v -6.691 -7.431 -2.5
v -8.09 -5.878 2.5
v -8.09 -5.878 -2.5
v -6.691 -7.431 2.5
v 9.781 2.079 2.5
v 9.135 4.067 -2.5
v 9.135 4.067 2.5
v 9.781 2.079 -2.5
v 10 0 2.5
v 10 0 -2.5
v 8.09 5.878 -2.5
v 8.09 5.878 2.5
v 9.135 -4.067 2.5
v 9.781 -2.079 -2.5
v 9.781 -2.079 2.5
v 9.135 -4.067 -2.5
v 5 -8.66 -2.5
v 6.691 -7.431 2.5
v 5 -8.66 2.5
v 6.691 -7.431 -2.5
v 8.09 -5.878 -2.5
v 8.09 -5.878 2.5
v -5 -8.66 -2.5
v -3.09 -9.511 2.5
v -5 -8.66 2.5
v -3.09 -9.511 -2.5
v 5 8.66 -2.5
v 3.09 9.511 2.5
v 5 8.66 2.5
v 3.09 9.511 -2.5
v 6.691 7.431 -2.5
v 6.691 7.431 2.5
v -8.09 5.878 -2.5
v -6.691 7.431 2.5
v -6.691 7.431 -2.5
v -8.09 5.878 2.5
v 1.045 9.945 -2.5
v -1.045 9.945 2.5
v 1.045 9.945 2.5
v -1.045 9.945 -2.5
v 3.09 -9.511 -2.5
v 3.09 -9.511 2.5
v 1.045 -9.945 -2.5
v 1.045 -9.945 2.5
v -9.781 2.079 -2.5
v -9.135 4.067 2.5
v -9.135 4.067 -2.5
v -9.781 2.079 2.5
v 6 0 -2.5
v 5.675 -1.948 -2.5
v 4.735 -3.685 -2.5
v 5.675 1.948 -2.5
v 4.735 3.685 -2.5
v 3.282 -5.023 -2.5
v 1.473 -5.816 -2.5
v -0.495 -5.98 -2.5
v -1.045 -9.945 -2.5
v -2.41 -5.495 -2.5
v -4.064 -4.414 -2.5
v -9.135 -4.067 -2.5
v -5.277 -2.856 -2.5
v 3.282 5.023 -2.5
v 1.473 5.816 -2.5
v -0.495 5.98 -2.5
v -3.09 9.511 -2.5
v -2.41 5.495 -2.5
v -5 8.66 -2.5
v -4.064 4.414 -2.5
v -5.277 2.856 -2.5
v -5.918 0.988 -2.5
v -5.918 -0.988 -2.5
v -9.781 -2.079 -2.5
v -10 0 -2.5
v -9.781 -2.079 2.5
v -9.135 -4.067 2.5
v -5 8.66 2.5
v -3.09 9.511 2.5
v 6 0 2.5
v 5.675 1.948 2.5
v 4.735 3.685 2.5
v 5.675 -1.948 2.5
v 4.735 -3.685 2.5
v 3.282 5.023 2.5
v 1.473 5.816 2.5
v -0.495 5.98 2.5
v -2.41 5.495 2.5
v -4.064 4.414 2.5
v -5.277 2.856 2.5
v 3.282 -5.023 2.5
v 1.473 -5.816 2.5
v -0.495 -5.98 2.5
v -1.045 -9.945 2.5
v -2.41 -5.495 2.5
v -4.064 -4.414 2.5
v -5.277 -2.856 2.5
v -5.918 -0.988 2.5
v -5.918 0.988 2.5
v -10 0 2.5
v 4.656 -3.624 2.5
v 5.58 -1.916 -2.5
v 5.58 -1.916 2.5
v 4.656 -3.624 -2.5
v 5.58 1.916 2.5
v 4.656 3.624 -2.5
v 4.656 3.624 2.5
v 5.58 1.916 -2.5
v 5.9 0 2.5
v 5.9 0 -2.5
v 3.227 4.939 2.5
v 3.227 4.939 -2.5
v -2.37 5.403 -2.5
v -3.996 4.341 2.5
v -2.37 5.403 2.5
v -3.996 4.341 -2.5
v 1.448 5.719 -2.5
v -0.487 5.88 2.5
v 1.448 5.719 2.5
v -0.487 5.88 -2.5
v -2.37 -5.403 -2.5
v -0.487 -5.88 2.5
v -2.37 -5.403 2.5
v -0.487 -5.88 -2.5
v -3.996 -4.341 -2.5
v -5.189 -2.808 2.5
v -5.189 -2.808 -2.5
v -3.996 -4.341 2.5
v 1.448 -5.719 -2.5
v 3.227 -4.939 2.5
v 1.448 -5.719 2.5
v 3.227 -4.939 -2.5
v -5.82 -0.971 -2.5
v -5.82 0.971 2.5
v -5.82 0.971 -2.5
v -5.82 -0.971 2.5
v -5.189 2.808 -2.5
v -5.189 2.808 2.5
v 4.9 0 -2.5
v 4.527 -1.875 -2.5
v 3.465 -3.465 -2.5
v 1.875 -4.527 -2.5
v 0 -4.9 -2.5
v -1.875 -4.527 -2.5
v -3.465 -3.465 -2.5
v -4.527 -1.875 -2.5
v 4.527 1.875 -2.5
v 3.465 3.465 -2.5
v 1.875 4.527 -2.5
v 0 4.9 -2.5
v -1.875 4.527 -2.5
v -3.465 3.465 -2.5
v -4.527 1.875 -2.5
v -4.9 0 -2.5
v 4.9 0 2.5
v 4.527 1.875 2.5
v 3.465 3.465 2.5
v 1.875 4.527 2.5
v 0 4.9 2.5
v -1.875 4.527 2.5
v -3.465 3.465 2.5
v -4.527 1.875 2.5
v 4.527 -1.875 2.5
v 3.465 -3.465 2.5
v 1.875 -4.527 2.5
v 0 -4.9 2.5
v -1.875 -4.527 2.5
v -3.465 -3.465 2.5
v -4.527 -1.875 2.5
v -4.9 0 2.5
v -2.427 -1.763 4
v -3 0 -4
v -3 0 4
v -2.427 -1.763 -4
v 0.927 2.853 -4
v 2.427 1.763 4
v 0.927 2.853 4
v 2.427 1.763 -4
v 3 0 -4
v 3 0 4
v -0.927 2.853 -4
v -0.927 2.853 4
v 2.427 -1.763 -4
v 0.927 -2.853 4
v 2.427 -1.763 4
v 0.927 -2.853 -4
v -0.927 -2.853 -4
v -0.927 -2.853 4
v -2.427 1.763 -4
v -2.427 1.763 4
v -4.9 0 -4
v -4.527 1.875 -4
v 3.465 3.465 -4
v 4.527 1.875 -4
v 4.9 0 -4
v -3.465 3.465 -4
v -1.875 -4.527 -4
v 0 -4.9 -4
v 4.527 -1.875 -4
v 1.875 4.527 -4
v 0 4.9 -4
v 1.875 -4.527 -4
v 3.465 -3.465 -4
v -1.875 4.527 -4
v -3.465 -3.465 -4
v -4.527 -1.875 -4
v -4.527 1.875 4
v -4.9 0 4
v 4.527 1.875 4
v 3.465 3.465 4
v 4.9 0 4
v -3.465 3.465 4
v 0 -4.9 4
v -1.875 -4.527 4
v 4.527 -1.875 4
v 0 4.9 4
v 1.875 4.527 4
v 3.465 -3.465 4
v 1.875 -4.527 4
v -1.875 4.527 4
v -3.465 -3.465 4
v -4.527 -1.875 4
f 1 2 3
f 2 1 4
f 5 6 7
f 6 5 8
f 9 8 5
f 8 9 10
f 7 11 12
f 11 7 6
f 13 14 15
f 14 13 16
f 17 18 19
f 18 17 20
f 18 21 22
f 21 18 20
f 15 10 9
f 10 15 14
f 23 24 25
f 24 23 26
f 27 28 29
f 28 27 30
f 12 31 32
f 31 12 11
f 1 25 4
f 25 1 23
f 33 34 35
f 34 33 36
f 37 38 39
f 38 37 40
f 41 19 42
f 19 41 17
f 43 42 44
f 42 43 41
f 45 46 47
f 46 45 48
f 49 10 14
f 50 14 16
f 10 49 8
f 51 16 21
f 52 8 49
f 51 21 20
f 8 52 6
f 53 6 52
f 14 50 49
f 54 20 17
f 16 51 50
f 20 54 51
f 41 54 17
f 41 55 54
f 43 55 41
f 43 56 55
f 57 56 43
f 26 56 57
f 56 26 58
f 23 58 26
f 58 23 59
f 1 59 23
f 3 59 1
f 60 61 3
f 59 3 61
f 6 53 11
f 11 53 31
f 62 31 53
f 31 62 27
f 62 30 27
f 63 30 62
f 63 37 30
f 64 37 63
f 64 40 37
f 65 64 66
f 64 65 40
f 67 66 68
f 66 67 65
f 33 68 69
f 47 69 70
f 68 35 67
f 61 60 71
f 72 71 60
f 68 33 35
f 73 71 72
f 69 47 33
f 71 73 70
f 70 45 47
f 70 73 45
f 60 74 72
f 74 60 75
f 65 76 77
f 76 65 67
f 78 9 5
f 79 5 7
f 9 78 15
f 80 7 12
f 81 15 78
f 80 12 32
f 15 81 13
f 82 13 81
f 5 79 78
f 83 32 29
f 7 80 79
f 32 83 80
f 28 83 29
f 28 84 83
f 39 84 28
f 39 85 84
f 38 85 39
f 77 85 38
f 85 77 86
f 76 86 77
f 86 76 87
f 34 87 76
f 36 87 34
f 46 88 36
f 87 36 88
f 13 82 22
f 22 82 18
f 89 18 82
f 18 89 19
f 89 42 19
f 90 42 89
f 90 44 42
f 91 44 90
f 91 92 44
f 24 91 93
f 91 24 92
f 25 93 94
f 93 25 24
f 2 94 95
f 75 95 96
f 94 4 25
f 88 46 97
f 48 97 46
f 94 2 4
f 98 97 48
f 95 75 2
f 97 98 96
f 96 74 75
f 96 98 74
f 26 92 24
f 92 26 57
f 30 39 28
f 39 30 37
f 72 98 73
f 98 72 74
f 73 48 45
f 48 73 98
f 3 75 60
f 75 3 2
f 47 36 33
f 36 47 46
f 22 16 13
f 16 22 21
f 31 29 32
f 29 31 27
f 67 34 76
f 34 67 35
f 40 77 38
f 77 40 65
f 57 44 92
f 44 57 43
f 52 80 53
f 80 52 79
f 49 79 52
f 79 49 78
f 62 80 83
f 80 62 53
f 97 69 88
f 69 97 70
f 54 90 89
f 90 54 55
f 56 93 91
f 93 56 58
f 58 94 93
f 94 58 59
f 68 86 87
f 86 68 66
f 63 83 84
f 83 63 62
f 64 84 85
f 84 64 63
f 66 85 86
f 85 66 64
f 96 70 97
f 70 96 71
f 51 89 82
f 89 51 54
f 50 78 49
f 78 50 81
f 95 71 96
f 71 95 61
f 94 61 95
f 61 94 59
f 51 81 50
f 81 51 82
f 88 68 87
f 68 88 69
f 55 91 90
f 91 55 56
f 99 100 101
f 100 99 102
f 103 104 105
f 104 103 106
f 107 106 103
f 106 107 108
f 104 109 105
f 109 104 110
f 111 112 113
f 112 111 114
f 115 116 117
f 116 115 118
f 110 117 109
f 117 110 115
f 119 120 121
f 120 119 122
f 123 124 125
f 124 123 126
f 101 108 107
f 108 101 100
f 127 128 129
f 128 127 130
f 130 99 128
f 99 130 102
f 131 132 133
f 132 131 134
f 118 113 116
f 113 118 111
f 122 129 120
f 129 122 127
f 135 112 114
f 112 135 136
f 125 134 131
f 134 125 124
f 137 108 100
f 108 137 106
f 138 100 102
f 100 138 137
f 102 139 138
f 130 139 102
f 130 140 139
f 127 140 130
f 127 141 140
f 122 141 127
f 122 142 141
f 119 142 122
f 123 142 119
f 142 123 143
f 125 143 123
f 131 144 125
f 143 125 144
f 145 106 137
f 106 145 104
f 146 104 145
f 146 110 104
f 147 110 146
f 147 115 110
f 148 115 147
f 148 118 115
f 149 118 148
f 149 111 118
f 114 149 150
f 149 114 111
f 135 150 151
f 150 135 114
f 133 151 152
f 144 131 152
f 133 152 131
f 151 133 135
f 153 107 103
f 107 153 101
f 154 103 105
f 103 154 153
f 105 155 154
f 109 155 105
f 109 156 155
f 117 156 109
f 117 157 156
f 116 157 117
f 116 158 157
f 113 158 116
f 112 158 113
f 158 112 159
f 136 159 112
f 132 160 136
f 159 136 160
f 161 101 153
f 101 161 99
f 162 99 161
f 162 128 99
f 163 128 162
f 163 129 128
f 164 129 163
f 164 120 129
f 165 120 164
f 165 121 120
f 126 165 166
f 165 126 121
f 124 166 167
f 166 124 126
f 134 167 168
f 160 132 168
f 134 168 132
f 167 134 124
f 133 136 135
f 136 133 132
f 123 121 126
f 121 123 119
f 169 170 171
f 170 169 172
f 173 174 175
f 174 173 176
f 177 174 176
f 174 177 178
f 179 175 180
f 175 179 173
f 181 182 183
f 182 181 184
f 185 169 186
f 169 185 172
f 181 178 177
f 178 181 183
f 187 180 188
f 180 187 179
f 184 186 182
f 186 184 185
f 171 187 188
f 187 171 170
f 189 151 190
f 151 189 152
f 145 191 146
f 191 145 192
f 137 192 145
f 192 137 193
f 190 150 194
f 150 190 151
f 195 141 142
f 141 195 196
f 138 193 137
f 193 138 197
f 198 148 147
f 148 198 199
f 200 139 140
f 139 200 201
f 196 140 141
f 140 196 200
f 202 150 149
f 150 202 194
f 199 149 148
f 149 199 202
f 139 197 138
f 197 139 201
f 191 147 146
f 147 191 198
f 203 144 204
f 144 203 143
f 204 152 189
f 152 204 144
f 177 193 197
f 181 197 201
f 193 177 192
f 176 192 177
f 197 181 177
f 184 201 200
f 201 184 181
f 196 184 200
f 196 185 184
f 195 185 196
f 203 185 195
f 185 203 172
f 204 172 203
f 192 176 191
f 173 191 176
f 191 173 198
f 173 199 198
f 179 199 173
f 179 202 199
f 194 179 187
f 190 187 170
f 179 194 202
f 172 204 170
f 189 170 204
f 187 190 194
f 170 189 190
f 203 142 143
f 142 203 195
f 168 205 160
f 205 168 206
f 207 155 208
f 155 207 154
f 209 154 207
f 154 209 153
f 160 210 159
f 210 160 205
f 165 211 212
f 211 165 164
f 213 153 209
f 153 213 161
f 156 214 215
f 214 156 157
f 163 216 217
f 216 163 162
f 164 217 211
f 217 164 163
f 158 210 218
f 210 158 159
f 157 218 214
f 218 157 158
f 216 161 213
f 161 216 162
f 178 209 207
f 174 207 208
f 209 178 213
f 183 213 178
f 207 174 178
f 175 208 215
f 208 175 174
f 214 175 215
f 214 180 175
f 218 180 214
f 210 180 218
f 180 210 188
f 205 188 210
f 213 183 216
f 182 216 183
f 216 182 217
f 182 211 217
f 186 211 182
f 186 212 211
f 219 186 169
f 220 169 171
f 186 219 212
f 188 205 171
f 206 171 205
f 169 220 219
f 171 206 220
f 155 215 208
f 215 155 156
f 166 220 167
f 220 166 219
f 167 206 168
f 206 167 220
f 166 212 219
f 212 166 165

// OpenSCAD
// file: 00_config.scad
// 00str00der v2 by Free Beachler
// Apache 2 License

/////// Global Settings ////////
o = 0.001;

filament_dia = 3;
filament_dia_tolerance = 0.1;	// +/- tolerance
filament_slot = 1;

belt_len = 90 * 2;  // for gt2 pulleys #of teeth x 2mm pitch

bowden = 0;	// 0 for bowden, 1 for direct drive
base_width = 30;
base_thickness = 4;
tower_height = 52;
pushfit_dia = 0.375*25.4;	// for bowden
pushfit_h = 0.25*25.4;		// for bowden
hob_pulley_offset = 3;	// move hob pulley up/down w/respect to drive pulley z-axis plane

knurled_bolt_dia = 6;
knurled_bolt_len = 65 + 5;	// + 5 for head
knurled_bolt_thread_len = 24;
knurled_bolt_knurl_pos = knurled_bolt_len - 24 - 10;	// pos from head
knurled_bolt_hob_width = 10;

bearing_sleeve = 1;		// 1 for sleeve bearings, 0 for roller bearings
bearing_id = 6.02 + 0.05;
bearing_od = 12.7 + 0.07;
bearing_height = 9.6;
bearing_flange_dia = 14.2;

idler_width = 30;
idler_leadout = 30;
idler_height = 13;
idler_roller_z_offset = 2.1;
idler_roller_leadout_offset = 0;

idler_bolt_dia = 6;
idler_bolt_len = 45;
idler_roller_dia = 20;	// diameter of idler roller
idler_roller_thickness = 5;
idler_bearing_od = 12;
idler_washer_dia = idler_bearing_od - 2;
idler_washer_thickness = 3;

/*
bearing_sleeve = 0;		// 1 for sleeve bearings, 0 for roller bearings
bearing_id = 8;
bearing_od = 22;
bearing_height = 16;
bearing_flange_dia = 13.5;
*/

/// gt2 pulley dias indexed by tooth size
gt2_pulley_dias = [ -1,
	-1, -1, -1, -1, -1, -1, -1, -1, -1, -1,
	-1, -1, -1, -1, -1, 10.19, 10.82, -1, -1, -1,
	-1, -1, -1, -1, -1, -1, -1, -1, -1, -1,
	-1, -1, -1, -1, -1, 22.92, -1, -1, -1, -1,
	-1, -1, -1, -1, -1, -1, -1, -1, -1, -1,
	-1, -1, -1, -1, -1, -1, -1, -1, -1, 38.2,
	-1, 39.47, -1, -1, 41.38, -1, -1, -1, -1, -1];
// file: 00_functions.scad
// 00str00der v2 by Free Beachler
// Apache 2 License

use <MCAD/motors.scad>
use <MCAD/nuts_and_bolts.scad>

// Calculate parameters for pulley separation
function aVal(belt_len, hobP, driveP) = (belt_len / 2) - 0.7855 * (hobP + driveP);
function bVal(a, hobP, driveP) = hobP > driveP ? a / (hobP - driveP) : a / (hobP + driveP);
function cVal(a, corr) = a / corr;

///// Calculate the correction factor
///// fit from tabulated data @ http://www.york-ind.com/print_cat/engineering.pdf
function corr(b) = 0.001937038323*pow(b,10) - 0.05808154202*pow(b,9) + 0.761293059*pow(b,8) - 5.736122913*pow(b,7) + 27.47727309*pow(b,6) - 87.33413058*pow(b,5) + 186.371874*pow(b,4) - 263.6175218*pow(b,3) + 236.7515116*pow(b,2) - 122.301777*pow(b,1) + 28.86267614;

module fillet(rad,height) {
	translate([-rad,-rad,0])
		difference() {
			translate([0,0,-height/2]) cube([rad-0.05,rad-0.05,height]);
cylinder(h=height+1,r=rad,center=true);
		}
}

module nutSlot(slot, tolerance, size = 4) {
	union() {
		for (i=[0:0.5:slot]) {
			translate([i,0,0]) nutHole(size,tolerance=tolerance);
		}
	}
}

module slot(radius, length, depth) {
	translate([0, -length / 2, 0]) rotate([0, 90, 0]) cylinder(r = radius, h = depth * 2, center = true);
	translate([0, 0, 0]) cube([depth * 2, length, radius * 2], center = true);
	translate([0, length / 2, 0]) rotate([0, 90, 0]) cylinder(r = radius, h = depth * 2, center = true);

}

module pulley(pulley_dia, flange_dia = 3, bore_dia = 8) {
	difference() {
		union() {
			color("Green",1) translate([0,0,6]) cylinder(r = pulley_dia / 2, h=11.2);
			color("Green",1) translate([0,0,6]) cylinder(r = pulley_dia / 2 + flange_dia / 2, h=1);
			color("Green",1) translate([0,0,17.2]) cylinder(r = pulley_dia / 2 + flange_dia / 2, h=1);
			color("DarkGreen",1) translate([0,0,0]) cylinder(r = 17.5/2, h=6.5);
		}
		cylinder(r = bore_dia / 2, h=50, center=true);
	}
}

module terawatt_knurled_bolt(len, dia, thread_len, knurl_pos, knurl_width) {
	union() {
		difference() {
			color("Gray",1) translate([0, 0, 0]) rotate([0,180,0]) boltHole(dia - 0.1, length = len - 1, tolerance = 0.5);
			translate([0, 0, -knurl_pos]) rotate([0,180,0]) cylinder(r = dia / 2 + 1, h = knurl_width, center = true);
		}
		color("Black",1) translate([0, 0, -len + thread_len / 2]) rotate([0,180,0]) cylinder(r = dia / 2, h = thread_len, center = true);
		color("Silver",1) translate([0, 0, -knurl_pos]) rotate([0,180,0]) cylinder(r = dia / 2 - 0.1, h = knurl_width, center = true);
	}
}

module hotend_w_screws() {
	union() {
		color("Black", 1) translate([0, 0, -35]) cylinder(r=5/16 * 25.4 + 0.25,h=35);
		// mnt screws
		color("Gray", 1) translate([0, 6 + 3/2 - 0.25, -4.76 - 3/2 - 0.75]) rotate([0,-90,0]) cylinder(r = 3/2 + 0.3, h = 50, center = true);
		color("Gray", 1) translate([0, -6 - 3/2 + 0.25, -4.76 - 3/2 - 0.75]) rotate([0, -90, 0]) cylinder(r = 3/2 + 0.3, h = 50, center = true);
	} 
}

module roller_bearing(id = 8, od = 22, height = 16, flange_dia = 13.5, tol = 0.1) {
	difference() {
		union() {
			color("FireBrick",1) cylinder(r = od / 2 + tol, h = height / 2 - 1, center=true);
			color("FireBrick",1) cylinder(r = flange_dia / 2 + tol, h = height / 2 + 2, center=true);
		}
		cylinder(r = id / 2, h = height * 2 + tol, center=true);
	}
}

module sleeve_bearing(id = 8.03, od = 15.9, height = 10.8, flange_dia = 17.4, tol = 0.1) {
	difference() {
		union() {
			translate([0, 0, (height + 1) / 2 - tol]) color("Purple",1) cylinder(r1 = od / 2 + tol, r2 = od / 2 - (od * sin(5 / 2)) + tol, h = height, center=true);
			color("Brown",1) cylinder(r = flange_dia / 2 + tol, h = 1, center=true);
		}
		cylinder(r = id / 2, h = height * 3 + tol, center=true);
	}
}

module stepper_w_pulley(pulley_dia) {
	stepper_motor_mount(17);
	translate([0, 0, 5]) pulley(pulley_dia, 3, 5);
}

module pulleys_and_bearings(hobP, driveP, CVal, hpoff, hob_dia, bsleeve, bid, bod, bht, bfdia, sep) {
	assign(offCVal = cos(asin(hpoff / CVal)) * CVal) {
	translate([bht * 1.5 + 3.5, 0, hpoff]) rotate([0, 90, 0]) pulley(hobP);
	if (bsleeve) {
		translate([sep, 0, hpoff]) rotate([0, 90, 180]) sleeve_bearing(bid, bod, bht, bfdia);
		translate([-sep, 0, hpoff]) rotate([0, 90, 0]) sleeve_bearing(bid, bod, bht, bfdia);
	} else {
		translate([sep, 0, hpoff]) rotate([0, 90, 0]) roller_bearing(bid, bod, bht, bfdia);
		translate([-sep, 0, hpoff]) rotate([0, 90, 0]) roller_bearing(bid, bod, bht, bfdia);
	}
	translate([bht + 5, -offCVal, 0]) rotate([0, 90, 0]) stepper_w_pulley(driveP); 
	}
}

module filament(fd = 3.3) {
	color("Blue",1) cylinder(r=fd / 2, h=100, center=true);
}
// main file
// 00str00der v2 by Free Beachler
// based on 00str00der v1 by Lee Miller and Free Beachler
// Apache 2 License

use <00_functions.scad>
include <00_config.scad>

terawatt_idler_roller();

module terawatt_idler_roller(bd = idler_bolt_dia, od = idler_roller_dia, thick = idler_roller_thickness, ibd = idler_bearing_od, washers = 1, wd = idler_washer_dia, wthick = idler_washer_thickness) {
	difference() {
		color("Gray", 1) cylinder(r = od / 2, h = thick, center = true);
		cylinder(r = ibd / 2, h = thick * 2, center = true);
	}
	// bushing
	difference() {
		color("White", 1) cylinder(r = ibd / 2 - 0.1, h = thick, center = true);
		cylinder(r = bd / 2, h = thick * 2, center = true);
	}
	if (washers) {
		for (i = [-1, 1]) {
			difference() {
				translate([0, 0, i * thick / 2]) color("Yellow", 1) cylinder(r = wd / 2 - 0.1, h = wthick, center = true);
				cylinder(r = bd / 2, h = thick * 2, center = true);
			}
		}
	}
}
